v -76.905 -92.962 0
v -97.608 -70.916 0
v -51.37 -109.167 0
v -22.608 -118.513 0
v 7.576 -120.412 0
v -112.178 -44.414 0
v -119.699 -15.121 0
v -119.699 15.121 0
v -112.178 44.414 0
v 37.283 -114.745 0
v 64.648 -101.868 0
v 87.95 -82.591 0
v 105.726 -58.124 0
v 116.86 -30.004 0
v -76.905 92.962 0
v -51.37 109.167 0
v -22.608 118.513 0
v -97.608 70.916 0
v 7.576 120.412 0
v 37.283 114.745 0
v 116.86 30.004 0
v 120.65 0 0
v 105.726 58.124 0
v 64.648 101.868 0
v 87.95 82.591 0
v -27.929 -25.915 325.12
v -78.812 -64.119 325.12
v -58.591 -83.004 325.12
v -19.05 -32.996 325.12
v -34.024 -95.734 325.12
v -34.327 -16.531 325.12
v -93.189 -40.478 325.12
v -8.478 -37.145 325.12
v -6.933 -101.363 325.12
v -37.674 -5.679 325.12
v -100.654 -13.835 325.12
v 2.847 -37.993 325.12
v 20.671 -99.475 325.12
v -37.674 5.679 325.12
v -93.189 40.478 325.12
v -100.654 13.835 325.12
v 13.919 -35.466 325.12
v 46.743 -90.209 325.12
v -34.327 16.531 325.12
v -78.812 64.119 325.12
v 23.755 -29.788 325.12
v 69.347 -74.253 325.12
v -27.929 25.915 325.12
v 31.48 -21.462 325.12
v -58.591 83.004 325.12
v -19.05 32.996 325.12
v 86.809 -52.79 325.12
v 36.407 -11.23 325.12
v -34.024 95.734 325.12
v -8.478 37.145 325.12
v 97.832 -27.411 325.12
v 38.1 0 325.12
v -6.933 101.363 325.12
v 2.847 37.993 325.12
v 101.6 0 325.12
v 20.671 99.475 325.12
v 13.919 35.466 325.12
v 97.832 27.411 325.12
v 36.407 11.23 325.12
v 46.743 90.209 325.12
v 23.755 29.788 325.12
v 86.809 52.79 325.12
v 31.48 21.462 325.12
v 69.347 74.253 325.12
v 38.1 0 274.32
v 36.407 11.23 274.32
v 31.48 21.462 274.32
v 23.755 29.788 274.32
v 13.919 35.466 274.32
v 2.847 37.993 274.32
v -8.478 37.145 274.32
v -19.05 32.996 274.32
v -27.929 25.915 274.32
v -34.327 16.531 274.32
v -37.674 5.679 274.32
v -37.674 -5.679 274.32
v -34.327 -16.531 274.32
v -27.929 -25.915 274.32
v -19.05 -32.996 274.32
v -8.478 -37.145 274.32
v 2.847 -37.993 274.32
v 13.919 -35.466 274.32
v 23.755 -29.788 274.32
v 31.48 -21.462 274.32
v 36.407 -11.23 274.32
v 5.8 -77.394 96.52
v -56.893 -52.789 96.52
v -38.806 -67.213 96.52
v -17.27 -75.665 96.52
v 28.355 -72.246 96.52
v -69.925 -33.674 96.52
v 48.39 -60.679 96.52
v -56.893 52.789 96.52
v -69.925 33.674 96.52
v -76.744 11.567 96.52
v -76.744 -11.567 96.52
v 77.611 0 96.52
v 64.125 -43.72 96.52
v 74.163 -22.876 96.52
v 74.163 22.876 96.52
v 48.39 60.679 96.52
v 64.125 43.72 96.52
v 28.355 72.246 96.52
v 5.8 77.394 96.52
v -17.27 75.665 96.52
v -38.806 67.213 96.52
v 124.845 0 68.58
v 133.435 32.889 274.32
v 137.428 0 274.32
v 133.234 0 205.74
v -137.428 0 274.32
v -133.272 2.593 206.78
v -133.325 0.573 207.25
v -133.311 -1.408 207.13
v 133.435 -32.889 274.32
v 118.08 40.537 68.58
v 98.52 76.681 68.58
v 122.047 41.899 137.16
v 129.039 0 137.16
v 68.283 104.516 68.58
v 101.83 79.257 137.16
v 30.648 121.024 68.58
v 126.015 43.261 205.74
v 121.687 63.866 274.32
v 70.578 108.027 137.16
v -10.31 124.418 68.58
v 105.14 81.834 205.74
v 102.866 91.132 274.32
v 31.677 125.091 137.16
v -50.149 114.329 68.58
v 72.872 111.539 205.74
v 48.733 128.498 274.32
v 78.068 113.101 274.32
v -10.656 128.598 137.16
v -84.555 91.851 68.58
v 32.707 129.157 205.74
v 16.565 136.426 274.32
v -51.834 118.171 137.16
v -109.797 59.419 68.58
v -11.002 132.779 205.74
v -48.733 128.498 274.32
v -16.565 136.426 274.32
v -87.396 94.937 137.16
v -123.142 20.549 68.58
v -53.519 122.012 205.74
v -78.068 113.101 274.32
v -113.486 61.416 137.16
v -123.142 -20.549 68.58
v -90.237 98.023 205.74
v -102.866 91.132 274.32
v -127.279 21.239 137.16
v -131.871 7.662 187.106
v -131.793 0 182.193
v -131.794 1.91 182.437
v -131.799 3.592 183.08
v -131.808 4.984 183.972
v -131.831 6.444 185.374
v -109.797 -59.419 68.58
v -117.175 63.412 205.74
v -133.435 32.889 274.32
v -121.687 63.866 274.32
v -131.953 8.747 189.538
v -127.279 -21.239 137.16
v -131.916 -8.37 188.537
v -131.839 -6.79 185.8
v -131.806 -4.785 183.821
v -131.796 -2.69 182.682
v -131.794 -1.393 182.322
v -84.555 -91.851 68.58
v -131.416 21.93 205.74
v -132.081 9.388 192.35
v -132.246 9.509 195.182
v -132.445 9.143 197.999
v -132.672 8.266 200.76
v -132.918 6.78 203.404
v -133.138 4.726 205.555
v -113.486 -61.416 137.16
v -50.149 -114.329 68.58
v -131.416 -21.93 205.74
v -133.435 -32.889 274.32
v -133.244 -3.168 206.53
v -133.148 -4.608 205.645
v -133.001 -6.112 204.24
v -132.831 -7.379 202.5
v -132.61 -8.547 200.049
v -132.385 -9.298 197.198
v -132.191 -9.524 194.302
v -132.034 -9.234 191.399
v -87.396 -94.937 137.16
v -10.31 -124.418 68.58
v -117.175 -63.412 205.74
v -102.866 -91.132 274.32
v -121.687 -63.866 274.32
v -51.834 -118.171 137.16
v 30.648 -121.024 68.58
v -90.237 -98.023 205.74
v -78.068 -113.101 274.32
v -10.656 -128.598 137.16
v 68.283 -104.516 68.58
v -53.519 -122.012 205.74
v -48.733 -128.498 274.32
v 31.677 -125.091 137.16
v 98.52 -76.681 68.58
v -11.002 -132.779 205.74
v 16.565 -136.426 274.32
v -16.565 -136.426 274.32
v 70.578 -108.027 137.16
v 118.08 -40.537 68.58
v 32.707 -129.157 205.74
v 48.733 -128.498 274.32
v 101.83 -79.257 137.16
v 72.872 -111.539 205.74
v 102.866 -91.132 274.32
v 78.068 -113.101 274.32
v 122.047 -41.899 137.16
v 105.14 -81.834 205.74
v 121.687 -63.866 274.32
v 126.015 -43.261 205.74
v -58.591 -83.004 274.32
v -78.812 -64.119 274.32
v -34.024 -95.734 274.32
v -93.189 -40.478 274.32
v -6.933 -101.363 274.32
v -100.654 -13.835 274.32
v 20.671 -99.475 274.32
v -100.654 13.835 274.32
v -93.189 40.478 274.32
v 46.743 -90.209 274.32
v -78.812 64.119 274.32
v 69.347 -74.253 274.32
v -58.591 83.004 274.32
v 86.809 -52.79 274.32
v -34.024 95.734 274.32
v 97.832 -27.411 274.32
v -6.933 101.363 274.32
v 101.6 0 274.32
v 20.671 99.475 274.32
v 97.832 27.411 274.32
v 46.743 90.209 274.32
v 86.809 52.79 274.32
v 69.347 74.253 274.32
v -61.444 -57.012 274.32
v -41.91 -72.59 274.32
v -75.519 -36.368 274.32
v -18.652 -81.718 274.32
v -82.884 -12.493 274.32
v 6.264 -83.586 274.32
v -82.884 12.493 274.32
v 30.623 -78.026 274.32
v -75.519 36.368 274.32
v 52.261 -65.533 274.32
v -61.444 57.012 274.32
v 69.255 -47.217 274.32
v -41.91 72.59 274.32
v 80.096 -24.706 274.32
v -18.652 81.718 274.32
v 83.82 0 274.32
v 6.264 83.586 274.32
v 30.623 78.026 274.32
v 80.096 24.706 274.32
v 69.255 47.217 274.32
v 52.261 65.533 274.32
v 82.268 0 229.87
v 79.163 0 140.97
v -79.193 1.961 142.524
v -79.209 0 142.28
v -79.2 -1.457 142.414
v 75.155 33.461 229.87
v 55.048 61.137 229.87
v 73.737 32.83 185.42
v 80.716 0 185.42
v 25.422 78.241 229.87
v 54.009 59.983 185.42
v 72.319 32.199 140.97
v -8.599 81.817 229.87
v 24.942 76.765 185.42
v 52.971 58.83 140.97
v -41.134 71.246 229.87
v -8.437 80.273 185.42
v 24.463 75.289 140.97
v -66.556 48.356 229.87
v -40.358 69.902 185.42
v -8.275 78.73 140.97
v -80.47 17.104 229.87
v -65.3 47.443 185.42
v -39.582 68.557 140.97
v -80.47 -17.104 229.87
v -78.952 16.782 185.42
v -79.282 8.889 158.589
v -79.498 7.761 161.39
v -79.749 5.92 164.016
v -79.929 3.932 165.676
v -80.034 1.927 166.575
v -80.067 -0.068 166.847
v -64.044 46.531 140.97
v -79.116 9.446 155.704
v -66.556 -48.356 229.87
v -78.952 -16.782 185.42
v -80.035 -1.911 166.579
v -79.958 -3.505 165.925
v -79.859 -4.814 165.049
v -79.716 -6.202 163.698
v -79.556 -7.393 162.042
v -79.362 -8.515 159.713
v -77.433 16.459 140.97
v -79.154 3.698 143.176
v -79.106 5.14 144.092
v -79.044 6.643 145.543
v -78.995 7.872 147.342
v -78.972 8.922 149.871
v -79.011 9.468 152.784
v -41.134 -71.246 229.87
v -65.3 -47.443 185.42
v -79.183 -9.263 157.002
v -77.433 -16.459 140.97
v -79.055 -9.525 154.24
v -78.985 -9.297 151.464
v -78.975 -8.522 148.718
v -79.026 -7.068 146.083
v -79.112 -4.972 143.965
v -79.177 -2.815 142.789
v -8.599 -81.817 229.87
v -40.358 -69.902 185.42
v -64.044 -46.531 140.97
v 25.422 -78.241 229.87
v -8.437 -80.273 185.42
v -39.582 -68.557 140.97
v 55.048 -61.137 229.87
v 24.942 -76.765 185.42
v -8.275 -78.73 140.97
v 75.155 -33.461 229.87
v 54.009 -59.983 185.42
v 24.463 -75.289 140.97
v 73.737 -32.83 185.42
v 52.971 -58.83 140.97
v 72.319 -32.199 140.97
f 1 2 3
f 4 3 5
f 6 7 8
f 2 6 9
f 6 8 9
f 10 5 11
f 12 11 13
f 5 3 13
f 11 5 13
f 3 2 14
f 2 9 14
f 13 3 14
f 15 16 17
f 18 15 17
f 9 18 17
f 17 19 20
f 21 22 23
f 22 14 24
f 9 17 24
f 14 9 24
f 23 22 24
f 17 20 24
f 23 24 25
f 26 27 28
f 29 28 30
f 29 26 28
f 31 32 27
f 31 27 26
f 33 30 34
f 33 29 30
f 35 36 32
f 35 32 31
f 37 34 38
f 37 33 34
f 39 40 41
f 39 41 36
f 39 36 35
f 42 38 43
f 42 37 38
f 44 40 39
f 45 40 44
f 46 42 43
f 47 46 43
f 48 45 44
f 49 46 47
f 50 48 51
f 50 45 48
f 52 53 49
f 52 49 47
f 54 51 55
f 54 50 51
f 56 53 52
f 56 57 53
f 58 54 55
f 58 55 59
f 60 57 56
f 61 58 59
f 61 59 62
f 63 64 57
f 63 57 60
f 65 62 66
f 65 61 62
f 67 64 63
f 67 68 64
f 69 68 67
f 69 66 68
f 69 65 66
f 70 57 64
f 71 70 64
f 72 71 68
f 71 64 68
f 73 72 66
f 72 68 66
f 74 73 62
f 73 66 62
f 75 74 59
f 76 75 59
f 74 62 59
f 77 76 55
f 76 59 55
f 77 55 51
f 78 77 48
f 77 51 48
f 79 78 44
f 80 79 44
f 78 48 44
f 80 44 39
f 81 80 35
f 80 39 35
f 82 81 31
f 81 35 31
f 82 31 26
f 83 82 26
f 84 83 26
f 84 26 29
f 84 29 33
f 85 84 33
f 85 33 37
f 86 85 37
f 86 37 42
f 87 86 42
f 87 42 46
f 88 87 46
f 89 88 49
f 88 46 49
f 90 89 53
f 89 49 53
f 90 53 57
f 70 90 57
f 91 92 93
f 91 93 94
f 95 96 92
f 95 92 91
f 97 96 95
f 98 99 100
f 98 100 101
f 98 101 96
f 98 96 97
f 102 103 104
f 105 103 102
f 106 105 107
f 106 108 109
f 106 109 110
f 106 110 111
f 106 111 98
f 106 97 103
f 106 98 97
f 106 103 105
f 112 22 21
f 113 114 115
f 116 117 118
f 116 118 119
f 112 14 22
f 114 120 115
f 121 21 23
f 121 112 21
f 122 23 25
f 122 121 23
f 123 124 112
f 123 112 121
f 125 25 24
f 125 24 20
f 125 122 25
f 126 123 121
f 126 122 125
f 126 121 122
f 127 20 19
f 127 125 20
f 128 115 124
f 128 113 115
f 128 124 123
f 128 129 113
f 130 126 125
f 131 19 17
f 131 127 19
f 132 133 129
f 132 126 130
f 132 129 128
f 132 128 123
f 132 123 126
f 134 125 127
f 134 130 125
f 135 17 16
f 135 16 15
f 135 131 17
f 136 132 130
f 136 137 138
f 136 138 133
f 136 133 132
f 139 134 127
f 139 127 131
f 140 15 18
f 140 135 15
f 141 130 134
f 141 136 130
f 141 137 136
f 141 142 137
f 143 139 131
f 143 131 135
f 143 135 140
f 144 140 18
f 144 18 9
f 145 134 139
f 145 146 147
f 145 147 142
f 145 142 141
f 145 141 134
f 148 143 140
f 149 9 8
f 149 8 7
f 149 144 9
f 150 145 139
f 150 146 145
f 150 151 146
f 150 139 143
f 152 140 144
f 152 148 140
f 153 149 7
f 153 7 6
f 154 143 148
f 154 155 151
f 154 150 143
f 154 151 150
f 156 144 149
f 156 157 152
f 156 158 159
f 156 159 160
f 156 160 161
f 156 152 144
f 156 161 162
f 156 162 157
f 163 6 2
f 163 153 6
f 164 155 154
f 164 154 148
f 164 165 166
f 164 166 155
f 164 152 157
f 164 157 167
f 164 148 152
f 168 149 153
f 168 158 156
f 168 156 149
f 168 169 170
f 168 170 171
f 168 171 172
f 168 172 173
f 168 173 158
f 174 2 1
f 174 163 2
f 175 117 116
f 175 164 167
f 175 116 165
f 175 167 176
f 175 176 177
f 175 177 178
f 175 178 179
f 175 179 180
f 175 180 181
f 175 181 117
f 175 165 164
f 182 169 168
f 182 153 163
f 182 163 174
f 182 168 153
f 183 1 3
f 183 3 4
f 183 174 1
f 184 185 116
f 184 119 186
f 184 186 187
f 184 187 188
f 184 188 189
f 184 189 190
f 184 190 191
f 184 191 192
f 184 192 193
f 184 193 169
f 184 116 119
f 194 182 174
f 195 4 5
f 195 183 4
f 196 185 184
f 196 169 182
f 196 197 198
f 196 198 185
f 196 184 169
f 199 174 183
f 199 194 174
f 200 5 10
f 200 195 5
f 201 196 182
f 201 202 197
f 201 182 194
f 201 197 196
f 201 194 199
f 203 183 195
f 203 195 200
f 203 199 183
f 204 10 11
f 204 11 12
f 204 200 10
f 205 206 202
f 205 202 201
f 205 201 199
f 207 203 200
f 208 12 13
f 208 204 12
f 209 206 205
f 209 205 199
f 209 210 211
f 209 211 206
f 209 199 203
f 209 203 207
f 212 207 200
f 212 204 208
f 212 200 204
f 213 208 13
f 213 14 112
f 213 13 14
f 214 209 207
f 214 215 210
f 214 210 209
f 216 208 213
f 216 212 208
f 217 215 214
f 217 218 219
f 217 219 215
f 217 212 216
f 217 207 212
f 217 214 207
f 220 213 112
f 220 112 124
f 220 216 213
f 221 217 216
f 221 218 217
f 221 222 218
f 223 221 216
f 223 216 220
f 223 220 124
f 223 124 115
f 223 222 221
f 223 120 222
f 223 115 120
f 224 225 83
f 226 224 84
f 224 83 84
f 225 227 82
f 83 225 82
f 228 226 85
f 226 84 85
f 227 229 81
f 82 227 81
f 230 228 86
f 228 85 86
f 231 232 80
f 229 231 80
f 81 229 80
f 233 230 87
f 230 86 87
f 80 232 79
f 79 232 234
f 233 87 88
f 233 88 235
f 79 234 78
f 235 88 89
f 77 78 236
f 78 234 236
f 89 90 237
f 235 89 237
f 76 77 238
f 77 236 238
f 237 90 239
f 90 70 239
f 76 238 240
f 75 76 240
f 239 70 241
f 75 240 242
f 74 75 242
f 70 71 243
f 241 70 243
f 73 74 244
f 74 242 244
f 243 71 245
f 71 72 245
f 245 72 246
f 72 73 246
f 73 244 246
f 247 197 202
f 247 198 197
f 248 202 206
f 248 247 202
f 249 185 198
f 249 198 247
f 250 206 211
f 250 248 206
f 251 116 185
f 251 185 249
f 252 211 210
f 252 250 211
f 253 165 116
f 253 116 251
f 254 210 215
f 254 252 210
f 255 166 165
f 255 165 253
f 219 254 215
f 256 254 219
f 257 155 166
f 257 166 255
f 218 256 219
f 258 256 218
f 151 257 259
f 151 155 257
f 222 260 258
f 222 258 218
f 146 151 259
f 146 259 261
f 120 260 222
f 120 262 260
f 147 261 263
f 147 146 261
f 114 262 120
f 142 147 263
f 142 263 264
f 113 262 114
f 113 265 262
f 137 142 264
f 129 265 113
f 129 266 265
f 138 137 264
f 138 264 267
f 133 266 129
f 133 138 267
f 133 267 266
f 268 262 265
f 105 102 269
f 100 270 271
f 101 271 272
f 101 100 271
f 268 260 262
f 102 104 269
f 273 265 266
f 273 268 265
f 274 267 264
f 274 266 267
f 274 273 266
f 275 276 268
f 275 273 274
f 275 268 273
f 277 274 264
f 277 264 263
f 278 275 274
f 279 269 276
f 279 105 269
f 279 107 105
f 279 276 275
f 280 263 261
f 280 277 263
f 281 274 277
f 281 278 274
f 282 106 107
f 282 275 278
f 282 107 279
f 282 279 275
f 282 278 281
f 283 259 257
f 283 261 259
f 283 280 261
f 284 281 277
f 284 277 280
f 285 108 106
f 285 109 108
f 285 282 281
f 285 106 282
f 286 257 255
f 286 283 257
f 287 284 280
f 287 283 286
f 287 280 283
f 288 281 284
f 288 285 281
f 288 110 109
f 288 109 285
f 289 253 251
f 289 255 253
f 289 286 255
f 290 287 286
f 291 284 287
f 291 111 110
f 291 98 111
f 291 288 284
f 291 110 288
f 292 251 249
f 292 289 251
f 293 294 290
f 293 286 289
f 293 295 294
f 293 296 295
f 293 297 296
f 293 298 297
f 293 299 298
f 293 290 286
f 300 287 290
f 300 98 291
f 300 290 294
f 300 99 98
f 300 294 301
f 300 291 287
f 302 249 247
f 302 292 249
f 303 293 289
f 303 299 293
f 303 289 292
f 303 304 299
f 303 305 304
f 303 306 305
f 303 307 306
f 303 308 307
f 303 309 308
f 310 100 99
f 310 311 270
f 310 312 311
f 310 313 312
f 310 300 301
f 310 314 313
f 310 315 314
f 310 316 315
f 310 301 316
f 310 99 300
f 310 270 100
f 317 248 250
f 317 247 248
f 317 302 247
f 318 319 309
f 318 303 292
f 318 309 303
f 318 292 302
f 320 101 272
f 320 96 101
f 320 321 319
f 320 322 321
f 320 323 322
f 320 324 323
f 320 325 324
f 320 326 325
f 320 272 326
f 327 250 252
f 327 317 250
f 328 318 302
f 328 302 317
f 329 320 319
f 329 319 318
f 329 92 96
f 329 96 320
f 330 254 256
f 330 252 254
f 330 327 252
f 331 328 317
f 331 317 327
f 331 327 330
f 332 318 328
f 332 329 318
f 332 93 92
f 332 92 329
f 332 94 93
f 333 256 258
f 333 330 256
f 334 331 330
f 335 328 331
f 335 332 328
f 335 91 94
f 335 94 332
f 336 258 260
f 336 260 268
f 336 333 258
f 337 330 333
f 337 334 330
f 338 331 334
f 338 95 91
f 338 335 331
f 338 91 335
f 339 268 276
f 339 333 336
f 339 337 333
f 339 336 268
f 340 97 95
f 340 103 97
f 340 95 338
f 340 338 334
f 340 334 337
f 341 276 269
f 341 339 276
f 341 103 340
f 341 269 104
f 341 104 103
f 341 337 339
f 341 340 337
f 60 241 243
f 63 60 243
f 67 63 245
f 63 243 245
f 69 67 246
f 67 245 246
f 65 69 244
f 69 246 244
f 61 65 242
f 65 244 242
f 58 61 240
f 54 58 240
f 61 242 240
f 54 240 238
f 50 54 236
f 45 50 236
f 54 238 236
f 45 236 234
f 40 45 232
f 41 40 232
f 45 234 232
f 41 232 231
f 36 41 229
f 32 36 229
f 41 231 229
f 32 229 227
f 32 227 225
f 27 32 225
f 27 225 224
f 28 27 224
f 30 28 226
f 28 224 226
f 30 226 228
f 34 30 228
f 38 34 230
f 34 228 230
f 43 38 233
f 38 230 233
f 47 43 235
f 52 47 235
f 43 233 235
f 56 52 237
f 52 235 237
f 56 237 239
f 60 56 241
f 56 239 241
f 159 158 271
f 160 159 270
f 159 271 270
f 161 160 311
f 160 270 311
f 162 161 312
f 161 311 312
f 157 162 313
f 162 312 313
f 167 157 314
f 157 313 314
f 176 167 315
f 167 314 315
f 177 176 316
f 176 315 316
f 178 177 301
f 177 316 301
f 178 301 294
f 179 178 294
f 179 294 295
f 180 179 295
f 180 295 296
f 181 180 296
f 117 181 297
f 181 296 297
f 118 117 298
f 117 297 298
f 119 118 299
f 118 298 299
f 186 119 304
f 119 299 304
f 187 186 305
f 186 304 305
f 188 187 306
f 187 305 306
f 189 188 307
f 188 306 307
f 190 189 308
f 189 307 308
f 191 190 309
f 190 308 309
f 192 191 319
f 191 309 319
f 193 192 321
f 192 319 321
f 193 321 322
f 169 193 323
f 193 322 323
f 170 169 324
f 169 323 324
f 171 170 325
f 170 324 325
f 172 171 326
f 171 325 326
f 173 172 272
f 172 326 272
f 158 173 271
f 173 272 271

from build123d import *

# Parameters (mm, degrees)
F0_R      = 120.65
F1_DEPTH  = 274.32
F1_TAPER  = -3.5
F3_R      = 83.82
F4_DEPTH  = 177.8
F4_TAPER  = 2
F7_R      = 101.6
F8_DEPTH  = 50.8
F9_R      = 38.1
F10_DEPTH = 50.8


with BuildPart() as f1:
    # F0 (on Top) → F1 (new body)
    with BuildSketch(Plane.XY):
        Circle(F0_R)
    extrude(amount=F1_DEPTH, taper=F1_TAPER)

    # F3 (on face) → F4 (cut)
    with BuildSketch(Plane.XY.offset(274.32)):
        Circle(F3_R)
    extrude(amount=-F4_DEPTH, taper=F4_TAPER, mode=Mode.SUBTRACT)

    # F5 (on Front) → F6 (revolve, cut)
    with BuildSketch(Plane.XZ):
        Polygon((-154.2451560917, 211.1928361759), (-160.0039376117, 203.6058696936), (-38.612473894, 111.4653653729), (-32.8536923739, 119.0523318553), align=None)
    revolve(axis=Axis((-93.5494242328, 0, 165.1225840156), (0.7965319142, 0, -0.604596485)), mode=Mode.SUBTRACT)


with BuildPart() as f8:
    # F7 (on face) → F8 (new body)
    with BuildSketch(Plane.XY.offset(274.32)):
        Circle(F7_R)
    extrude(amount=F8_DEPTH)

    # F9 (on face) → F10 (cut)
    with BuildSketch(Plane.XY.offset(325.12)):
        Circle(F9_R)
    extrude(amount=-F10_DEPTH, mode=Mode.SUBTRACT)


solid = Compound([f1.part, f8.part])
